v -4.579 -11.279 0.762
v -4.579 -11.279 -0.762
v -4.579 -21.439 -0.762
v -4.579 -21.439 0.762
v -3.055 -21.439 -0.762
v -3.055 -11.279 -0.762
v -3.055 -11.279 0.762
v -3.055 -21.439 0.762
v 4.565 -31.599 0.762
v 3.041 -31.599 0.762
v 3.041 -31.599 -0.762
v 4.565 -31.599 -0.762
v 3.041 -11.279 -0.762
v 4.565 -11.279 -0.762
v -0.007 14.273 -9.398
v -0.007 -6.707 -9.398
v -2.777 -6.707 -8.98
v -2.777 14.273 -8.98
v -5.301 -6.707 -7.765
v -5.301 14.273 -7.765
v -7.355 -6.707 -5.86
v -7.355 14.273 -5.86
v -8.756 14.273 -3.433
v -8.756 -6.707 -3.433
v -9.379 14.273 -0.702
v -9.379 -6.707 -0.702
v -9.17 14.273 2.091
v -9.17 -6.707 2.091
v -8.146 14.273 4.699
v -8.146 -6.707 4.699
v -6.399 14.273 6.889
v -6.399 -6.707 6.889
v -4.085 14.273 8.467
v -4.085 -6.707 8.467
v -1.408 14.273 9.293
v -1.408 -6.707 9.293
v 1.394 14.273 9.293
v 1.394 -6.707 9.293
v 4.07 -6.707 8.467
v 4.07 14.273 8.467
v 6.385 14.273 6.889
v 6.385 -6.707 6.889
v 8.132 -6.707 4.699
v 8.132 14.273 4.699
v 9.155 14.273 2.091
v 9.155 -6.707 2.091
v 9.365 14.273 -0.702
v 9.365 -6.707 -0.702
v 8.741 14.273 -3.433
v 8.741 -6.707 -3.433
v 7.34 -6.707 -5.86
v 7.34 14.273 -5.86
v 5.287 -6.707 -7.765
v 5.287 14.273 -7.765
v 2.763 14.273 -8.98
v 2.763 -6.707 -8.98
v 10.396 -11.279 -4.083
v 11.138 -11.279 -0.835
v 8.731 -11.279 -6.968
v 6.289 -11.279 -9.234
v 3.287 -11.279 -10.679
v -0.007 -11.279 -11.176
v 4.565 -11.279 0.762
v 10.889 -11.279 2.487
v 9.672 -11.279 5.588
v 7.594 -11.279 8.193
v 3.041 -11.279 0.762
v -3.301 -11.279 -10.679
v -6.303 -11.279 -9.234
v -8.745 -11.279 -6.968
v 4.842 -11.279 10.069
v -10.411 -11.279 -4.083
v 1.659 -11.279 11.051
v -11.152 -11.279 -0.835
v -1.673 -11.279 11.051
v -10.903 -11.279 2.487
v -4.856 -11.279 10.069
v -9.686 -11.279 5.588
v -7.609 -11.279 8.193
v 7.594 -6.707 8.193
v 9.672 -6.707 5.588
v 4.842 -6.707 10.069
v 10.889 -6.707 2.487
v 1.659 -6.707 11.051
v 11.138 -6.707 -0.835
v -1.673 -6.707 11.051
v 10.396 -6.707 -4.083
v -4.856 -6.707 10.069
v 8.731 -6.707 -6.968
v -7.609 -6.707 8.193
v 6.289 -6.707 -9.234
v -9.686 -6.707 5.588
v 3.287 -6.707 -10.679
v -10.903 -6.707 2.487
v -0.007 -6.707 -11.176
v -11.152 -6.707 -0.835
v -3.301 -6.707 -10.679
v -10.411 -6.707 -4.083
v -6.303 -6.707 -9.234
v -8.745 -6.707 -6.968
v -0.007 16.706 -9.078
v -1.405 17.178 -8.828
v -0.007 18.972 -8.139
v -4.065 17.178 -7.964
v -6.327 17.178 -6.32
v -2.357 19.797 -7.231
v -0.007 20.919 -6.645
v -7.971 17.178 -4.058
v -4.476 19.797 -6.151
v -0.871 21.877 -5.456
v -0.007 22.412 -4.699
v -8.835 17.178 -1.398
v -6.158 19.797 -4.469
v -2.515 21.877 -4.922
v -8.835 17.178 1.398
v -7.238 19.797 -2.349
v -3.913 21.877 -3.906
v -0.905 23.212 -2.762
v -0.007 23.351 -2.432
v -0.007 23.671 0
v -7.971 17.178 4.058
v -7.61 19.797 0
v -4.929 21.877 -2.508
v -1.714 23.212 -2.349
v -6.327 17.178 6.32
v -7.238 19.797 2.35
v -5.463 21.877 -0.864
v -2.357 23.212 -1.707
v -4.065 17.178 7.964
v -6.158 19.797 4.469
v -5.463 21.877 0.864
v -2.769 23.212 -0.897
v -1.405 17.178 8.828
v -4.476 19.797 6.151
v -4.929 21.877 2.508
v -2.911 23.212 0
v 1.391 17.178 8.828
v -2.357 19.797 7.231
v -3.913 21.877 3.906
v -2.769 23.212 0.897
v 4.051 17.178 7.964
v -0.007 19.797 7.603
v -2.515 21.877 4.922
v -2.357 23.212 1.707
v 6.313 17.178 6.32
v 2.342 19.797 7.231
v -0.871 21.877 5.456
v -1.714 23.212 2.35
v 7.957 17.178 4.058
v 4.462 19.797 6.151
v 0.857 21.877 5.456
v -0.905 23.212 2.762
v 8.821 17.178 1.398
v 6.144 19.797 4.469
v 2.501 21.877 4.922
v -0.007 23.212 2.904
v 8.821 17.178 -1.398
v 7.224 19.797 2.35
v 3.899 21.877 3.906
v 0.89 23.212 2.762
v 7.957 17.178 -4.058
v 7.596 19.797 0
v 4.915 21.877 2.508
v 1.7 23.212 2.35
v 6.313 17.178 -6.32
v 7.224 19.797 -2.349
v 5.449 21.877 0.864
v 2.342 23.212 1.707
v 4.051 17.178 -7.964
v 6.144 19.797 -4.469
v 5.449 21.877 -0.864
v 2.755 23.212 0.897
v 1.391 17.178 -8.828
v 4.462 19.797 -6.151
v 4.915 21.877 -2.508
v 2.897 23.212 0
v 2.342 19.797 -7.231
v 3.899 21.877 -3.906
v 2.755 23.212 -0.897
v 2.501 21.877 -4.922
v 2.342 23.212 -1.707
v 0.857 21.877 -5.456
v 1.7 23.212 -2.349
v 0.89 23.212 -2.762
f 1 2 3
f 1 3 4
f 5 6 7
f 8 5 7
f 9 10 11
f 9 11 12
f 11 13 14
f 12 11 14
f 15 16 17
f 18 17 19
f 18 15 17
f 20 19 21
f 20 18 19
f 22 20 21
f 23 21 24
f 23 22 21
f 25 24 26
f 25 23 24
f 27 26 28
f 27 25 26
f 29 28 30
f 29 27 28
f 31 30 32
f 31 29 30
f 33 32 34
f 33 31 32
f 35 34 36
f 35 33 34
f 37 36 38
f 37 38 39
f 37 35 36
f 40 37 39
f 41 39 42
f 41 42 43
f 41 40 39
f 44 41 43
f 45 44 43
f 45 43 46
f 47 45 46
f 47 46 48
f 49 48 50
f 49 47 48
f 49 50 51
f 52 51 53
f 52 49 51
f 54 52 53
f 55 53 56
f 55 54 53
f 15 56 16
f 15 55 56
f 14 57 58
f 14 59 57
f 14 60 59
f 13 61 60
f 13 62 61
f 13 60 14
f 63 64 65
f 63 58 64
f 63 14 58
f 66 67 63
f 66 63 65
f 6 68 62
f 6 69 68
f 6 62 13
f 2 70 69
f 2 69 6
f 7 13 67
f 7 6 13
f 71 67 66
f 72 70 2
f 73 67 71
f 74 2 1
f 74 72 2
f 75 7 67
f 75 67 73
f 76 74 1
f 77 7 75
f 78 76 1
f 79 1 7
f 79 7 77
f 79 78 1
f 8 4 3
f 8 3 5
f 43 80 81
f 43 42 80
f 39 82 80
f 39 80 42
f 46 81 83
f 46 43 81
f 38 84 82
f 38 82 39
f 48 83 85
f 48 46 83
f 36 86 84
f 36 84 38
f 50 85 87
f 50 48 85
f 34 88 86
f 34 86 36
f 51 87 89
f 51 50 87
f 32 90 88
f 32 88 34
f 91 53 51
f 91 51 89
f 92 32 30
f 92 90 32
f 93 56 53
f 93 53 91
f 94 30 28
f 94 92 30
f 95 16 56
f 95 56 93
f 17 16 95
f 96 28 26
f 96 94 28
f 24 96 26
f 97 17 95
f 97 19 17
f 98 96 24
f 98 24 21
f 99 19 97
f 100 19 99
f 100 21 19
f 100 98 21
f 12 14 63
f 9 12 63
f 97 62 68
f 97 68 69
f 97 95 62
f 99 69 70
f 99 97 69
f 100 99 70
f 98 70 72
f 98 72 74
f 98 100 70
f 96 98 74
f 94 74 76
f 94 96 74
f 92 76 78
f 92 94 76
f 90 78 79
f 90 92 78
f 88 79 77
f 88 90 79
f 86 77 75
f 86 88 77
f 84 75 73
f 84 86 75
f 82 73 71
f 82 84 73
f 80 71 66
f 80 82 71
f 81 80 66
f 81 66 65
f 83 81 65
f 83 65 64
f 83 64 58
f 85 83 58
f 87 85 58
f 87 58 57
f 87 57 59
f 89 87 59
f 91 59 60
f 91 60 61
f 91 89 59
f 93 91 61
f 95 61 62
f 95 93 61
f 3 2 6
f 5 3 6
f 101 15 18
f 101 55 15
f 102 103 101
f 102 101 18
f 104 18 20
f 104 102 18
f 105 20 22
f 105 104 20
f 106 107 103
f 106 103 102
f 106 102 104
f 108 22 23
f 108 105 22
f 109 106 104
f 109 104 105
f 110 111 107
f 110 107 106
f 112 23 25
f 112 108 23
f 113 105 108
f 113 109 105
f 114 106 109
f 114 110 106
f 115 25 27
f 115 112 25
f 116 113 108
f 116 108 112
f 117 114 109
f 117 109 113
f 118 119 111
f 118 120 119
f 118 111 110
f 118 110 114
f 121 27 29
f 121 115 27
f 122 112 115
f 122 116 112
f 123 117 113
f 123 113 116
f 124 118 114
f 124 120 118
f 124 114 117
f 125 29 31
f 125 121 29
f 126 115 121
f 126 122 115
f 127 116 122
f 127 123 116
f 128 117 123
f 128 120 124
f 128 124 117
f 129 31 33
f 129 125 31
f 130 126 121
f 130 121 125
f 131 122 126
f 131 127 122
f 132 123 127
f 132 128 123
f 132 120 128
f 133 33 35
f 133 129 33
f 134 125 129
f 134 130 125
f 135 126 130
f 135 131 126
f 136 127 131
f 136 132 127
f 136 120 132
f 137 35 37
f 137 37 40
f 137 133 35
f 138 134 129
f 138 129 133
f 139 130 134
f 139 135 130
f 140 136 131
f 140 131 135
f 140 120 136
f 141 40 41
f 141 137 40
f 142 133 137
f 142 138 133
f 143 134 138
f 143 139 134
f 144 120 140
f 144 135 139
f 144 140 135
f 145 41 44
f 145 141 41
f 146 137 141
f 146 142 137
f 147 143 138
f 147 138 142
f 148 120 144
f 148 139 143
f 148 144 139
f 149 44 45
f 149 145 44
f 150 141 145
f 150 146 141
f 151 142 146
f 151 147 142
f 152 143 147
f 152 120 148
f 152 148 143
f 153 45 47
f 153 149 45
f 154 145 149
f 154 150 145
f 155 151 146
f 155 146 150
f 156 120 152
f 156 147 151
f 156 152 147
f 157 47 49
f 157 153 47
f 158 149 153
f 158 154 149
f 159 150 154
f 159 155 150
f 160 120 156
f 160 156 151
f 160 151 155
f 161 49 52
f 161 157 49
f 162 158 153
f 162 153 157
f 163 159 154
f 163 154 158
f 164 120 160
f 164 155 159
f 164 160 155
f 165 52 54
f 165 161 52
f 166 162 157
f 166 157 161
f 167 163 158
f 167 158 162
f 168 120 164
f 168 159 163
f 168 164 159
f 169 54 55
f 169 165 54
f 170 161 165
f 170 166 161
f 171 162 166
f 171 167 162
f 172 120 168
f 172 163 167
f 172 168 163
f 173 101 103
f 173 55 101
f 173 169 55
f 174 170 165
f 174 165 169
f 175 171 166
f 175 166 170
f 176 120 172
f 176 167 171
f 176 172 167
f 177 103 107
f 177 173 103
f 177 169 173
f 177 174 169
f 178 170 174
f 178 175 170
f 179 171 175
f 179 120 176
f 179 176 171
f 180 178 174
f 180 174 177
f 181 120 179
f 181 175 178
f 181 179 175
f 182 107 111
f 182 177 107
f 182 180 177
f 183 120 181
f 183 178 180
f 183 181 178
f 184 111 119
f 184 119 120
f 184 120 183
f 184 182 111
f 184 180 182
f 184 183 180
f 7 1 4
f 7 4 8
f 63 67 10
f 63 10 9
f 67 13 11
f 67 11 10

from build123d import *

# Parameters (mm, degrees)
SKETCH3_W           = 0.381
SKETCH3_H           = 0.381
BOSS_EXTRUDE1_DEPTH = 5.08
SKETCH3_4_W         = 0.381
SKETCH3_4_H         = 0.381
BOSS_EXTRUDE2_DEPTH = 2.54
ECHELLE1_SCALE      = 4


with BuildPart() as part:
    # Sketch2 → Revolve1 (revolve)
    with BuildSketch(Plane.XY):
        with BuildLine():
            Line((0, 0), (2.794, 0))
            Line((2.794, 0), (2.794, 1.143))
            Line((2.794, 1.143), (2.3495, 1.143))
            Line((2.3495, 1.143), (2.3495, 6.3881))
            ThreePointArc((2.3495, 6.3881), (1.661347382, 8.049447382), (0, 8.7376))
            Line((0, 8.7376), (0, 0))
        make_face()
    revolve(axis=Axis((0, 0, 0), (0, 1, 0)))

    # Sketch3 → Boss-Extrude1 (add)
    with BuildSketch(Plane.XZ):
        with Locations((0.9525, 0)):
            Rectangle(SKETCH3_W, SKETCH3_H)
    extrude(amount=BOSS_EXTRUDE1_DEPTH)

    # Sketch3<4> → Boss-Extrude2 (add)
    with BuildSketch(Plane.XZ):
        with Locations((-0.9525, 0)):
            Rectangle(SKETCH3_4_W, SKETCH3_4_H)
    extrude(amount=BOSS_EXTRUDE2_DEPTH)


with BuildPart() as part_1:
    # Echelle1: scaled about (0.002384831, 3.75963667, 0)
    add(part.part.scale(ECHELLE1_SCALE).moved(Location((-0.007154493, -11.27891001, 0))))


solid = part_1.part
